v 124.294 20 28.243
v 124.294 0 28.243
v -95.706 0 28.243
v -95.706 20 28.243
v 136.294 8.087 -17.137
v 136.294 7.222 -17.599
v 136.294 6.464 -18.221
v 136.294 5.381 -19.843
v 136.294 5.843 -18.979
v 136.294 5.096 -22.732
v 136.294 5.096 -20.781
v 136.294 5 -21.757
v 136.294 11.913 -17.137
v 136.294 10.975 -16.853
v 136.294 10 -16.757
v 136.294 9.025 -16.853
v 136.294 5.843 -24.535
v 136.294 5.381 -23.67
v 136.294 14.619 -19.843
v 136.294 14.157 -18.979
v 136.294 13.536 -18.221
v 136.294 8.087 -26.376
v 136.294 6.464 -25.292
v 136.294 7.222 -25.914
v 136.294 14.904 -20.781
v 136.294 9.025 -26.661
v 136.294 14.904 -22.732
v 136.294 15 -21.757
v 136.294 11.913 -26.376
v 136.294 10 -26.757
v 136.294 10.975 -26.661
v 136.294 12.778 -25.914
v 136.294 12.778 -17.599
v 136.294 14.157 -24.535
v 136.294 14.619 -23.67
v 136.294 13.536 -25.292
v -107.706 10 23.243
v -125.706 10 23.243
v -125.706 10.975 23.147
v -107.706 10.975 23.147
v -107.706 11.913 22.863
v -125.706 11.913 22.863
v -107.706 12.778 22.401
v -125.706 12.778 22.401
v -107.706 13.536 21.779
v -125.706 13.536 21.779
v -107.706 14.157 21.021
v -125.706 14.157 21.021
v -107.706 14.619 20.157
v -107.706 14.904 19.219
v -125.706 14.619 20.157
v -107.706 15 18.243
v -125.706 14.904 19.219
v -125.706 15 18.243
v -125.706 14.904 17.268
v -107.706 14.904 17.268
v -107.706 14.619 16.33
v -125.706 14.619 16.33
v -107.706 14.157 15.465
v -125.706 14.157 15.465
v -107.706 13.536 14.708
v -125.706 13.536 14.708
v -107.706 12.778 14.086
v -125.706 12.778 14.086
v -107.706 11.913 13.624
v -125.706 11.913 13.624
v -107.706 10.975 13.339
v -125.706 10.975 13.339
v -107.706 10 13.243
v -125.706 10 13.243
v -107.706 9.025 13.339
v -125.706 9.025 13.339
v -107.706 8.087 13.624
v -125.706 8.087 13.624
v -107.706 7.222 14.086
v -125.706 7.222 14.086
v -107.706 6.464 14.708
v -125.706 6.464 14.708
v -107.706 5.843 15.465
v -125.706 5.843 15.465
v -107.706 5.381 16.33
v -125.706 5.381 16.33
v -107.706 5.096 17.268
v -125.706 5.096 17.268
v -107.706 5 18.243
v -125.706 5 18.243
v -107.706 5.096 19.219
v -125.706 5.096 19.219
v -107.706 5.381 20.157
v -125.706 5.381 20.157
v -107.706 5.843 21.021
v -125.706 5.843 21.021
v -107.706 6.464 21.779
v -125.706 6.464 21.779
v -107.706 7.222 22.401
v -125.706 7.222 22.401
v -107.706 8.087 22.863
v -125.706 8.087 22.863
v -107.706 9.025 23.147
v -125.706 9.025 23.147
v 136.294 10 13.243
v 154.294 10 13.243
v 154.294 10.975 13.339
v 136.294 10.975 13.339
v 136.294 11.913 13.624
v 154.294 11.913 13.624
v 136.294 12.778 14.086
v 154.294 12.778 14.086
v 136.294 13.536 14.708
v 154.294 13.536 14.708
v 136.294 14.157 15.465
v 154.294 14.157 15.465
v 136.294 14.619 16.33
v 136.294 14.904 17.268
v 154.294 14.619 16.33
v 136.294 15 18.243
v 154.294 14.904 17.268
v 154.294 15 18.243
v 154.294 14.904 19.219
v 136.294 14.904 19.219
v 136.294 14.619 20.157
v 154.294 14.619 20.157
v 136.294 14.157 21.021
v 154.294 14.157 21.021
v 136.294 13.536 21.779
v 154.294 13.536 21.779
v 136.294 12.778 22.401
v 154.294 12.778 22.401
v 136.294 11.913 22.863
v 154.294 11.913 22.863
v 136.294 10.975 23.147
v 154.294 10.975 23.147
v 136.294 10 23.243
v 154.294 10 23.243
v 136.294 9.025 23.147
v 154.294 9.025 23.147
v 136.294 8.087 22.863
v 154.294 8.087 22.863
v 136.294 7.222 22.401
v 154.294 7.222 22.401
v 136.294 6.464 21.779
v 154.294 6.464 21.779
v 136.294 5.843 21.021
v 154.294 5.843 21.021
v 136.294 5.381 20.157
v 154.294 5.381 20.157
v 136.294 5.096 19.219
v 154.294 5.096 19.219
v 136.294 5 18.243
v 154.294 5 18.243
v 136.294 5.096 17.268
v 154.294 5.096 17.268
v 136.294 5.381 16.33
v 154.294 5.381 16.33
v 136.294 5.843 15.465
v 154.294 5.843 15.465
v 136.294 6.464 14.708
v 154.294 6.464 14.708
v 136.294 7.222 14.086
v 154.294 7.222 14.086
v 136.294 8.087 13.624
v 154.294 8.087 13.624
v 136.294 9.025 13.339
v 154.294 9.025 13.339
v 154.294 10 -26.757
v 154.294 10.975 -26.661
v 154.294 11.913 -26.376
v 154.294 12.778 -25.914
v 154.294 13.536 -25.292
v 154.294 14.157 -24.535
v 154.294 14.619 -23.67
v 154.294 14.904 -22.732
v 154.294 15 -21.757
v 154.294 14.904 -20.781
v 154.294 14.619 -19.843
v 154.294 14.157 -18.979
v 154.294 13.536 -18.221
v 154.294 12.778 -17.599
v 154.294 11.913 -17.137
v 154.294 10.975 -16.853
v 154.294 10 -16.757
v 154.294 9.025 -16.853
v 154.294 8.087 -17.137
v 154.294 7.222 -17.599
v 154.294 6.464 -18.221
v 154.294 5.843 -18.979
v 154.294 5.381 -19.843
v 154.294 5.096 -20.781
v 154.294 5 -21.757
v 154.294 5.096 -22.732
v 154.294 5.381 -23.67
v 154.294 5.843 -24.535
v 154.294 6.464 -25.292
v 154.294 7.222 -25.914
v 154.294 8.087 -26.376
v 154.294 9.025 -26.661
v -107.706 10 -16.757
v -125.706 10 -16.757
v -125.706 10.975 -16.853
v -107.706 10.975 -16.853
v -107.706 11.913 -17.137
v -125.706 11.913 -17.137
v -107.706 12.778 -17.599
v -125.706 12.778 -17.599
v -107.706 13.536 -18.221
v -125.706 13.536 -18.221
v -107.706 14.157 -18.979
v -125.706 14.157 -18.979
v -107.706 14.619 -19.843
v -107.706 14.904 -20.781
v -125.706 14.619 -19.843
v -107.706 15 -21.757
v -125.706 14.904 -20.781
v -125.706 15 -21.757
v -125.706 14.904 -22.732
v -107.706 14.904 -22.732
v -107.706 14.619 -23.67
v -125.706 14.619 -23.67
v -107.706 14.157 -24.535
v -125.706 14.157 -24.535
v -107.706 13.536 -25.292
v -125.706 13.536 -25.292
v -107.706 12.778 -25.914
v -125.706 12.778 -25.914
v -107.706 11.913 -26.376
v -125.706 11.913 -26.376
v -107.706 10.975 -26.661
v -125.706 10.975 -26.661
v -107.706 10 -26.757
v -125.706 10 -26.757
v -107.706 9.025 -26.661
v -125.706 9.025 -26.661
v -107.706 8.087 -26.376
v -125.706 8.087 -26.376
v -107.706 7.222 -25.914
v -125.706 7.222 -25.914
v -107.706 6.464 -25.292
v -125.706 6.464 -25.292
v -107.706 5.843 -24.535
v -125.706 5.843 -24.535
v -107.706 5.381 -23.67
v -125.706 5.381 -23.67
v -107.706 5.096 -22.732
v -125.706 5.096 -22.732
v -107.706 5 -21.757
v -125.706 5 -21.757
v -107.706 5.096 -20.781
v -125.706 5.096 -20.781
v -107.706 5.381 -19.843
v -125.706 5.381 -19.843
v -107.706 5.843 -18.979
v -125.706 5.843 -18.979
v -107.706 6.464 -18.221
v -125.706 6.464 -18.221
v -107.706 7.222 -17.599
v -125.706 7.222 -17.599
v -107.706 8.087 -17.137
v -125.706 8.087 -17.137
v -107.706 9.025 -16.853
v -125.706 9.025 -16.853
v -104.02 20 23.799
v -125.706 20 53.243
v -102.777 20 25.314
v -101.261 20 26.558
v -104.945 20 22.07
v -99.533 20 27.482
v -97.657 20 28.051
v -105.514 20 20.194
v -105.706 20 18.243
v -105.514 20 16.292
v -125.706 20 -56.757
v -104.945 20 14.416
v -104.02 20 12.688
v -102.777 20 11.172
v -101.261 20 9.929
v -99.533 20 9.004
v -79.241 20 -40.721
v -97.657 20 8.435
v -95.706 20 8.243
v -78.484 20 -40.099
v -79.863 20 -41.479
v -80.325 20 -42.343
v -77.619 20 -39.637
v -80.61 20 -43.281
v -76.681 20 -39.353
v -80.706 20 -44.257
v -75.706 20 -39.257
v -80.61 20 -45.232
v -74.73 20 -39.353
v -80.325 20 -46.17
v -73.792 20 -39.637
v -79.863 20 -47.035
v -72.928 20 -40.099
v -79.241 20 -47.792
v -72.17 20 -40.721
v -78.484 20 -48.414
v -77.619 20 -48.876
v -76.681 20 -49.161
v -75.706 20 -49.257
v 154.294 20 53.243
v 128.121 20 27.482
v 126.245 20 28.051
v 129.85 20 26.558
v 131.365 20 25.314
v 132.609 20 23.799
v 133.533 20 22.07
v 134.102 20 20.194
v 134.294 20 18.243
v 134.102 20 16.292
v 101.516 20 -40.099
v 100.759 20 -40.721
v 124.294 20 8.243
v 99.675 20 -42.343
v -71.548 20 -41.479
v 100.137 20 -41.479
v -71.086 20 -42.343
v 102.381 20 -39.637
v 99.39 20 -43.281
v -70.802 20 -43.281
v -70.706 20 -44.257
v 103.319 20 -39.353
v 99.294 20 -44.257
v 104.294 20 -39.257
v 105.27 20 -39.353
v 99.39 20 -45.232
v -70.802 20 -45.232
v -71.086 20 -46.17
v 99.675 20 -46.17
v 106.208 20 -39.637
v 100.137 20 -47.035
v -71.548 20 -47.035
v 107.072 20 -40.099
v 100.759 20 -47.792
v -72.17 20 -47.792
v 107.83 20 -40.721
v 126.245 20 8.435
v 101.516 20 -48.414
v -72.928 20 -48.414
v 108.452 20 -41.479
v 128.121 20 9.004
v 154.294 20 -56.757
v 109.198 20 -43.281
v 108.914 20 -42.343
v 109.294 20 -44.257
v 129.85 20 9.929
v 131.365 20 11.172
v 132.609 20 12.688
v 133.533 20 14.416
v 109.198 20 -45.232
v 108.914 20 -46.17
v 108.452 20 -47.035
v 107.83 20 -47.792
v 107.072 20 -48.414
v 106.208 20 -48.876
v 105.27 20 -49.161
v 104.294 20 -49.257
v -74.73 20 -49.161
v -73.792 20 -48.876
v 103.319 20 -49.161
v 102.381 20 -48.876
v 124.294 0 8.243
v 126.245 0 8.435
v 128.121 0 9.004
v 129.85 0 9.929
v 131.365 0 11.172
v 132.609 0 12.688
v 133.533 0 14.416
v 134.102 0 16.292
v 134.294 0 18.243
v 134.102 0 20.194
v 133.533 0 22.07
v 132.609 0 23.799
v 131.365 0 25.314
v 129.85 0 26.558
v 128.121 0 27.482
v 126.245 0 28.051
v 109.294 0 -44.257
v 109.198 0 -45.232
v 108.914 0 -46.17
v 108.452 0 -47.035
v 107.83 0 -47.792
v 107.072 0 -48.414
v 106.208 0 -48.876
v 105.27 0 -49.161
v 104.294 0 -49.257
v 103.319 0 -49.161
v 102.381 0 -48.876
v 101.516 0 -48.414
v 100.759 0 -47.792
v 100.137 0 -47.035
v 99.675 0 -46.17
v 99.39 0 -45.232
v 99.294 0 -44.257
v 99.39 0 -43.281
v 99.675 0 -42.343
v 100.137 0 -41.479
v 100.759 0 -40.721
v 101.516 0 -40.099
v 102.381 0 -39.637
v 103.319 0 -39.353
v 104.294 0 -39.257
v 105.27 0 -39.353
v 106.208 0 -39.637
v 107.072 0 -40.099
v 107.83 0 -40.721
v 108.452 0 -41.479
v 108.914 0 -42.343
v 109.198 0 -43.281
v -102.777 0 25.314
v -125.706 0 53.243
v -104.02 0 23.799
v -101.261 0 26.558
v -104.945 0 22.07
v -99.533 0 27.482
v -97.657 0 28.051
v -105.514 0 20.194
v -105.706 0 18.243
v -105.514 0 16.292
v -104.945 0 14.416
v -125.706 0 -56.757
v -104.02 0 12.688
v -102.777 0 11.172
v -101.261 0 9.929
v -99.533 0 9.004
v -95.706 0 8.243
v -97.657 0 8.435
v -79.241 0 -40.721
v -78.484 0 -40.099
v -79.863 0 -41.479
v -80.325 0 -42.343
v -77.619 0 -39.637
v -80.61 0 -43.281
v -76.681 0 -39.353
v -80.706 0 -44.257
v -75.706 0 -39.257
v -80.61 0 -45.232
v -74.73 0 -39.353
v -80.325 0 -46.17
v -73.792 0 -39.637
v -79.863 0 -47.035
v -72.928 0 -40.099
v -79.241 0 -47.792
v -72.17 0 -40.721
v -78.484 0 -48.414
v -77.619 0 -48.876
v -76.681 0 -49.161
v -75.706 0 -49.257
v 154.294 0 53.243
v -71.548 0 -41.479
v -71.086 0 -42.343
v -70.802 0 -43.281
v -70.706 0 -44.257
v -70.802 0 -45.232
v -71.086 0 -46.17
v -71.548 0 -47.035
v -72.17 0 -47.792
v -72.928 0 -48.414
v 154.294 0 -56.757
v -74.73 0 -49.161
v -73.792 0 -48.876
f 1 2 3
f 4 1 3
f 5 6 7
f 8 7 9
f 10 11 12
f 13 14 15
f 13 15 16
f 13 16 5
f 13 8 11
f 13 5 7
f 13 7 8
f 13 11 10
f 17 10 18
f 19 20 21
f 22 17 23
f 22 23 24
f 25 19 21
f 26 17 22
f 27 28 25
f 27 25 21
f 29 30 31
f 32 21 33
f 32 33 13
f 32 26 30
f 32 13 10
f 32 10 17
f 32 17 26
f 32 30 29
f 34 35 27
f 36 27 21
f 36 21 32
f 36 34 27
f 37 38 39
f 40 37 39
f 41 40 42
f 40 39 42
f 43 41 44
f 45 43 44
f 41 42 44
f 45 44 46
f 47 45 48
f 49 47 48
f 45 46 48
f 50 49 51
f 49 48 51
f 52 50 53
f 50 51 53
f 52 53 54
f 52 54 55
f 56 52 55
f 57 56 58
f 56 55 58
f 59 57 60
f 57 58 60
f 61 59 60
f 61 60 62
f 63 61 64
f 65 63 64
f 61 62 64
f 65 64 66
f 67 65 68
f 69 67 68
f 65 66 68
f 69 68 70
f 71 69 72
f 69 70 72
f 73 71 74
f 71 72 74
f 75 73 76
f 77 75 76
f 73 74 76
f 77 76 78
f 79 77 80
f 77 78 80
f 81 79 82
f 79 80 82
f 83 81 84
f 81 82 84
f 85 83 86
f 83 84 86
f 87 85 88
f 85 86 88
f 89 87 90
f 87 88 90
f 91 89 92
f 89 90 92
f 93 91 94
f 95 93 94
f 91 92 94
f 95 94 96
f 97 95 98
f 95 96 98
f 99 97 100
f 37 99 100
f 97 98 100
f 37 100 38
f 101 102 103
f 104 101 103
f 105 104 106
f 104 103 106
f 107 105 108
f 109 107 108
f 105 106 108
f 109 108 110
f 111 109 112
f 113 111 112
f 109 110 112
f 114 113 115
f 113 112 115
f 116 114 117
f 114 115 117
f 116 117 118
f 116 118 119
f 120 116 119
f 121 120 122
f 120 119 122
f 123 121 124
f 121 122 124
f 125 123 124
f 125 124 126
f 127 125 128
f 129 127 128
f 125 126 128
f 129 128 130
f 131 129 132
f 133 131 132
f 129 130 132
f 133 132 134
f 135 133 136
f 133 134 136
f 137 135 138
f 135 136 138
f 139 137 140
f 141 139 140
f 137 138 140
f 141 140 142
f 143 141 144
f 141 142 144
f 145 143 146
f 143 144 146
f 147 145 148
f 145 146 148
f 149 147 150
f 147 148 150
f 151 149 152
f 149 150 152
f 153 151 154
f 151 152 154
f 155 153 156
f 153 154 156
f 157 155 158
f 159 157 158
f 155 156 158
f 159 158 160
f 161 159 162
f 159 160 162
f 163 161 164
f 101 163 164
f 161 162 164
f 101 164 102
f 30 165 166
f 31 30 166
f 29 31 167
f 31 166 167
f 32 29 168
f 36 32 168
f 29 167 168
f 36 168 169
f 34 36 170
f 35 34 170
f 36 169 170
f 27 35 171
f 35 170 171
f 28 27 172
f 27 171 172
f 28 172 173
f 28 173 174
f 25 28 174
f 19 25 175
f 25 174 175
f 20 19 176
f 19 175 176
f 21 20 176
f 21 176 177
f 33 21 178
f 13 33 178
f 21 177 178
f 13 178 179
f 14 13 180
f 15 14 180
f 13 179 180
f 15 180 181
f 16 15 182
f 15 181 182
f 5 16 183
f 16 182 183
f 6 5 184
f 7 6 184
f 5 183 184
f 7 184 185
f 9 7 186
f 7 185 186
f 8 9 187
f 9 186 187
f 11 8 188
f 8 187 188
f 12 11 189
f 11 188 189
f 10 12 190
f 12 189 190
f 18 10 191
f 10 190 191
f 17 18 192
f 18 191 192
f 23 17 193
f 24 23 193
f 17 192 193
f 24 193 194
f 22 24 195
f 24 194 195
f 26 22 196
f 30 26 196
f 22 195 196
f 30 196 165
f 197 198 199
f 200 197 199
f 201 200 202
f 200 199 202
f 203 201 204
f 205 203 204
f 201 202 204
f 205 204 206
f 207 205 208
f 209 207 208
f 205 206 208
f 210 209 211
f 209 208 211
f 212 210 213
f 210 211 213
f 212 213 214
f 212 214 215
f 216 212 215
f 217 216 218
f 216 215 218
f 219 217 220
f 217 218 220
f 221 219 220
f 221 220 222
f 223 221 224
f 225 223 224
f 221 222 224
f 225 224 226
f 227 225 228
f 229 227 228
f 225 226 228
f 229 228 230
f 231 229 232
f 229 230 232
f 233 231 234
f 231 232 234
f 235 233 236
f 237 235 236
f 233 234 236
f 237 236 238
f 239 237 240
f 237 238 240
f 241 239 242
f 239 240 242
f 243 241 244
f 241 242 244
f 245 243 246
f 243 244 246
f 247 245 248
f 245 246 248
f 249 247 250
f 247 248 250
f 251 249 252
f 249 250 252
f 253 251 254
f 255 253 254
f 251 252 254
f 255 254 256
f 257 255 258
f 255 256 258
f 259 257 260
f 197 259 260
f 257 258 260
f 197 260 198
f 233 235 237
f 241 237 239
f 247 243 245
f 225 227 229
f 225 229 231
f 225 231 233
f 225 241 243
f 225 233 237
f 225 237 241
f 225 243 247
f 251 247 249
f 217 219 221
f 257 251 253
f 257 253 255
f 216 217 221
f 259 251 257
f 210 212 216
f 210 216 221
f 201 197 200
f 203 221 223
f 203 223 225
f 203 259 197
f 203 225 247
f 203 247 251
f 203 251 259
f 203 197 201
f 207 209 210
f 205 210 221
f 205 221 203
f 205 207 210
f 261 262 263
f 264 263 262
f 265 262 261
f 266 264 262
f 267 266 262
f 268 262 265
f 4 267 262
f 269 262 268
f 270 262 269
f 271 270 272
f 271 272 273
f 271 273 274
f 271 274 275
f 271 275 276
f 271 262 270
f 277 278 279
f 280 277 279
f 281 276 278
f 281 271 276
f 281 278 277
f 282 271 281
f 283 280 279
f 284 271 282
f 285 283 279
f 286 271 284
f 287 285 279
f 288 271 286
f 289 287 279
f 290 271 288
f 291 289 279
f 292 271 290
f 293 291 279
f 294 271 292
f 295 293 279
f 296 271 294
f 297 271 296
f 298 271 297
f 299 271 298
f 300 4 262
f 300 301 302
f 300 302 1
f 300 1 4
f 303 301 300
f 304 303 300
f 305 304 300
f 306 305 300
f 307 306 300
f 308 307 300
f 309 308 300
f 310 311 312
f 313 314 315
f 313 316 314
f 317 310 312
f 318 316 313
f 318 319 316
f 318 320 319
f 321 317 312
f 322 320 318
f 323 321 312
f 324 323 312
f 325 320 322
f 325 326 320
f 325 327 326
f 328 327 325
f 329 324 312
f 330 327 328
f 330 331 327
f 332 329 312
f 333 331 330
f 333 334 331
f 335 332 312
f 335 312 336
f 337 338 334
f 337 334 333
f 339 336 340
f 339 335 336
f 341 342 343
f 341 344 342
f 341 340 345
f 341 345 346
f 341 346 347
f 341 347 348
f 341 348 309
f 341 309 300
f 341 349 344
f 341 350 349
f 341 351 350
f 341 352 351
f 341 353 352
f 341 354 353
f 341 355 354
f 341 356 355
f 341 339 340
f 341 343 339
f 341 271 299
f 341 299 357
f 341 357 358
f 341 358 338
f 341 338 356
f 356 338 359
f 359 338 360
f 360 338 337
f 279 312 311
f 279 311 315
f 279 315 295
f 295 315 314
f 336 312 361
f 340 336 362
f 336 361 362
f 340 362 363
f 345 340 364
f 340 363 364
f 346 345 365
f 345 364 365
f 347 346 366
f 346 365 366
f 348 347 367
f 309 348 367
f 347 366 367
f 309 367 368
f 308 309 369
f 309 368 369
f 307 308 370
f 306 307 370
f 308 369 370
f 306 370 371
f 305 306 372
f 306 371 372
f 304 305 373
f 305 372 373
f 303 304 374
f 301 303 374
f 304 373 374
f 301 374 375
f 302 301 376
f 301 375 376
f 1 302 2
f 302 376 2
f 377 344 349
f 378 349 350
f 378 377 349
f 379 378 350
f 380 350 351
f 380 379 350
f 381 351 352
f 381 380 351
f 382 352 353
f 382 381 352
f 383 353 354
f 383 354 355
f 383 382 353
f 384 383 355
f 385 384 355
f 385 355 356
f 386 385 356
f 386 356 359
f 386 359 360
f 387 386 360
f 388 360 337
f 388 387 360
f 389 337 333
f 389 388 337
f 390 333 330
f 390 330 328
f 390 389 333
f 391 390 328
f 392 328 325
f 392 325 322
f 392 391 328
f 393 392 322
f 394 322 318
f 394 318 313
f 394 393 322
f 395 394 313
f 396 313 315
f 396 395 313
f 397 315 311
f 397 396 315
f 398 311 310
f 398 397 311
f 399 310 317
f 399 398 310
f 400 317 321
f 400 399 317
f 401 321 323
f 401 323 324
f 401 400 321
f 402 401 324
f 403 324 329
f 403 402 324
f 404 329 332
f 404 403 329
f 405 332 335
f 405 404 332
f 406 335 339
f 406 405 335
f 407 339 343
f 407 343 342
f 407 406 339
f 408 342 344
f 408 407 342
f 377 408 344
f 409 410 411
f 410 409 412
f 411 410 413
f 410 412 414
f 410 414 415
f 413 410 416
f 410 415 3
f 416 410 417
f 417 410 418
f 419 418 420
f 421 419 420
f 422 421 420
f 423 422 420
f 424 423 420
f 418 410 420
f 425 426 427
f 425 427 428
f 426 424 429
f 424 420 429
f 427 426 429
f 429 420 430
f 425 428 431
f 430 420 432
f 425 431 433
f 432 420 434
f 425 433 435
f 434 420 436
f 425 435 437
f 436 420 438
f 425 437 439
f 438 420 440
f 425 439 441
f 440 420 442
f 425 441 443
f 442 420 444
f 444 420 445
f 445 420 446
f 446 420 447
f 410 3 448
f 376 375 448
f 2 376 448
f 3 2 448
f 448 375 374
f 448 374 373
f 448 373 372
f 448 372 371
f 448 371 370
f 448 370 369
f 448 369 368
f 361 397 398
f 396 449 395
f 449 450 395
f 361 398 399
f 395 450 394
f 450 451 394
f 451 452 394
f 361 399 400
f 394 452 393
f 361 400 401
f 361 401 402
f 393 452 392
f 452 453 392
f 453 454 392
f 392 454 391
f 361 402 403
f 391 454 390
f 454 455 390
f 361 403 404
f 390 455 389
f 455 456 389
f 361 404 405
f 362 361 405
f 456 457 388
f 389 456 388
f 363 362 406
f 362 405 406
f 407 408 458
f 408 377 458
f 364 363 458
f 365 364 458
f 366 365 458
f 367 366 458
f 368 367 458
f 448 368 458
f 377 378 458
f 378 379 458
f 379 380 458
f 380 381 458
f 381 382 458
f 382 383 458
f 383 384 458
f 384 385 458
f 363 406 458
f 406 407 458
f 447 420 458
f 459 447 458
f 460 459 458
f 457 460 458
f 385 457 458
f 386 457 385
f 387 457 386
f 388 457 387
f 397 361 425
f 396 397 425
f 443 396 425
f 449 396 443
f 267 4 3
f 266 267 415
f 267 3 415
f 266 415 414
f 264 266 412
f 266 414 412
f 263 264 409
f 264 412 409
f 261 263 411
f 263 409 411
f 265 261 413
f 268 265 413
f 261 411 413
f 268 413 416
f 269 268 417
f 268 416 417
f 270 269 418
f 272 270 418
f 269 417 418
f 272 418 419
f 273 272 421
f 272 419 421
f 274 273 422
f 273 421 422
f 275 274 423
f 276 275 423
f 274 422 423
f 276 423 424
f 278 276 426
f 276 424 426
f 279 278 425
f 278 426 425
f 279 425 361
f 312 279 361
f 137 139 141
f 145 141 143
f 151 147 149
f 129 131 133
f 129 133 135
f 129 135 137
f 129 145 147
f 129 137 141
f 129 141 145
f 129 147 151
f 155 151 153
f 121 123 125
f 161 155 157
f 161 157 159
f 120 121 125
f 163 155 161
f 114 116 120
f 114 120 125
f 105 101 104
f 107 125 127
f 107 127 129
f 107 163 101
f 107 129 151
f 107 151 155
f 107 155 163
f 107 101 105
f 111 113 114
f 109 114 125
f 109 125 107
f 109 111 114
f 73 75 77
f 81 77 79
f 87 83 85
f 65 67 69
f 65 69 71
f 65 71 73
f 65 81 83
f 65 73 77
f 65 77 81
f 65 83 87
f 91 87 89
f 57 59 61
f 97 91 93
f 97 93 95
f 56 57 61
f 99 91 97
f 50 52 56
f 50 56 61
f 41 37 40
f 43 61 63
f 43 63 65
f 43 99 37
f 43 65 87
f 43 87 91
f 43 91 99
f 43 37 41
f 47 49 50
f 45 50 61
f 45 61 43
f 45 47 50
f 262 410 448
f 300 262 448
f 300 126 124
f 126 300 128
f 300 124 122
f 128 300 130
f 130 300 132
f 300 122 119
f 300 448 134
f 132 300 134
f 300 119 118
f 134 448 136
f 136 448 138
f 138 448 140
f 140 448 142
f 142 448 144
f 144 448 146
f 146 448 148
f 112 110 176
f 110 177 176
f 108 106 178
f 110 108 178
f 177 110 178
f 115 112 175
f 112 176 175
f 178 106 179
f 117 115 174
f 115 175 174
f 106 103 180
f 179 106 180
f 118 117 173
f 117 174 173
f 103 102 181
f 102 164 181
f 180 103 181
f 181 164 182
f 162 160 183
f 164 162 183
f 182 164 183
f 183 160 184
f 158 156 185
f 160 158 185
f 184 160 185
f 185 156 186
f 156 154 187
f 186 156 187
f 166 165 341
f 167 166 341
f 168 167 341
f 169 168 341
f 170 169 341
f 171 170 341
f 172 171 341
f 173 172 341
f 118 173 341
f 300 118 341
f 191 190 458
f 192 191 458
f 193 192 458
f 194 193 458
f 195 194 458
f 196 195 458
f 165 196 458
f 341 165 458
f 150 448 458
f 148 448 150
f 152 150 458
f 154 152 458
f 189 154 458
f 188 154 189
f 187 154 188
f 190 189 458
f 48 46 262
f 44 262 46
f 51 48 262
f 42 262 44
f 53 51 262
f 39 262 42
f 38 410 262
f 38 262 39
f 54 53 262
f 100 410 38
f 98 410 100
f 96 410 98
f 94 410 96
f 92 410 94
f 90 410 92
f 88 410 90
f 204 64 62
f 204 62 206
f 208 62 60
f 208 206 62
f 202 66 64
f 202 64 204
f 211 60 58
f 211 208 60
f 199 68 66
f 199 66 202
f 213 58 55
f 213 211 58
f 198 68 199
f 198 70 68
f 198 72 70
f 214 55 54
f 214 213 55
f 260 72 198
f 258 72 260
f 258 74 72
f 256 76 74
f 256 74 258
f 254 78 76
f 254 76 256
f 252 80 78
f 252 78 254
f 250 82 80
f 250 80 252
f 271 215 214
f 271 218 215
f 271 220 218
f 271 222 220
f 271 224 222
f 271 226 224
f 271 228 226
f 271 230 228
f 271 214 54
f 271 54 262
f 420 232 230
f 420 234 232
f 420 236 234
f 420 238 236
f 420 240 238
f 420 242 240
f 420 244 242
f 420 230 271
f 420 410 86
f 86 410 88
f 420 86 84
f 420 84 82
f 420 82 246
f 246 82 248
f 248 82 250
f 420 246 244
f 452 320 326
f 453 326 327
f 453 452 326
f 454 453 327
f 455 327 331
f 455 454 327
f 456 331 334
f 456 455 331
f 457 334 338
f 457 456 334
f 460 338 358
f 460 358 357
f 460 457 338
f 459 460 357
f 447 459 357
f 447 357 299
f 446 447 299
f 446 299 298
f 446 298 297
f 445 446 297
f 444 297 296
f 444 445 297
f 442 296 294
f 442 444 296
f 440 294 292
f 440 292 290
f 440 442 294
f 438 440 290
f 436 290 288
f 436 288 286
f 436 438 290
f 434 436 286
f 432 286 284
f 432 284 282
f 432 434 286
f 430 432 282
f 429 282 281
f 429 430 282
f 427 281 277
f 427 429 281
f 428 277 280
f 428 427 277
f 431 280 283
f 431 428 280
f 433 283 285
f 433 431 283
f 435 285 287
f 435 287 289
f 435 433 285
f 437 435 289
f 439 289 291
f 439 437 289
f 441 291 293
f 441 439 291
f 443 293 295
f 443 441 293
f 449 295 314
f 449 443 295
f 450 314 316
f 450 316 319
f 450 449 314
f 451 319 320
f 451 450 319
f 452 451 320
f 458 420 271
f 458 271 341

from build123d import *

# Parameters (mm, degrees)
CROQUIS1_W              = 280
CROQUIS1_H              = 110
SALIENTE_EXTRUIR1_DEPTH = 20
CORTAR_EXTRUIR2_DEPTH   = 20
CROQUIS4_R              = 5
CORTAR_EXTRUIR4_DEPTH   = 20
CROQUIS5_R              = 5
CORTAR_EXTRUIR5_DEPTH   = 18
CROQUIS6_R              = 5
CORTAR_EXTRUIR6_DEPTH   = 18


with BuildPart() as part:
    # Croquis1 → Saliente-Extruir1 (new body)
    with BuildSketch(Plane(origin=(0, 0, 0), x_dir=(1, 0, 0), z_dir=(0, 1, 0))):
        with Locations((14.294294294, 1.756756757)):
            Rectangle(CROQUIS1_W, CROQUIS1_H)
    extrude(amount=SALIENTE_EXTRUIR1_DEPTH)

    # Croquis2 → Cortar-Extruir2 (cut)
    with BuildSketch(Plane(origin=(0, 0, 0), x_dir=(1, 0, 0), z_dir=(0, 1, 0))):
        with BuildLine():
            Line((-95.705705706, -8.243243243), (124.294294294, -8.243243243))
            ThreePointArc((124.294294294, -8.243243243), (134.294294294, -18.243243243), (124.294294294, -28.243243243))
            Line((124.294294294, -28.243243243), (-95.705705706, -28.243243243))
            ThreePointArc((-95.705705706, -28.243243243), (-105.705705706, -18.243243243), (-95.705705706, -8.243243243))
        make_face()
    extrude(amount=CORTAR_EXTRUIR2_DEPTH, mode=Mode.SUBTRACT)

    # Croquis4 → Cortar-Extruir4 (cut)
    with BuildSketch(Plane(origin=(0, 0, 0), x_dir=(1, 0, 0), z_dir=(0, 1, 0))):
        with Locations((104.294294294, 44.256756757)):
            Circle(CROQUIS4_R)
        with Locations((-75.705705706, 44.256756757)):
            Circle(CROQUIS4_R)
    extrude(amount=CORTAR_EXTRUIR4_DEPTH, mode=Mode.SUBTRACT)

    # Croquis5 → Cortar-Extruir5 (cut)
    with BuildSketch(Plane.ZY.offset(125.705705706)):
        with Locations((18.243243243, 10)):
            Circle(CROQUIS5_R)
        with Locations((-21.756756757, 10)):
            Circle(CROQUIS5_R)
    extrude(amount=-CORTAR_EXTRUIR5_DEPTH, mode=Mode.SUBTRACT)

    # Croquis6 → Cortar-Extruir6 (cut)
    with BuildSketch(Plane(origin=(154.294294294, 0, 0), x_dir=(0, 0, -1), z_dir=(1, 0, 0))):
        with Locations((21.756756757, 10)):
            Circle(CROQUIS6_R)
        with Locations((-18.243243243, 10)):
            Circle(CROQUIS6_R)
    extrude(amount=-CORTAR_EXTRUIR6_DEPTH, mode=Mode.SUBTRACT)


solid = part.part
